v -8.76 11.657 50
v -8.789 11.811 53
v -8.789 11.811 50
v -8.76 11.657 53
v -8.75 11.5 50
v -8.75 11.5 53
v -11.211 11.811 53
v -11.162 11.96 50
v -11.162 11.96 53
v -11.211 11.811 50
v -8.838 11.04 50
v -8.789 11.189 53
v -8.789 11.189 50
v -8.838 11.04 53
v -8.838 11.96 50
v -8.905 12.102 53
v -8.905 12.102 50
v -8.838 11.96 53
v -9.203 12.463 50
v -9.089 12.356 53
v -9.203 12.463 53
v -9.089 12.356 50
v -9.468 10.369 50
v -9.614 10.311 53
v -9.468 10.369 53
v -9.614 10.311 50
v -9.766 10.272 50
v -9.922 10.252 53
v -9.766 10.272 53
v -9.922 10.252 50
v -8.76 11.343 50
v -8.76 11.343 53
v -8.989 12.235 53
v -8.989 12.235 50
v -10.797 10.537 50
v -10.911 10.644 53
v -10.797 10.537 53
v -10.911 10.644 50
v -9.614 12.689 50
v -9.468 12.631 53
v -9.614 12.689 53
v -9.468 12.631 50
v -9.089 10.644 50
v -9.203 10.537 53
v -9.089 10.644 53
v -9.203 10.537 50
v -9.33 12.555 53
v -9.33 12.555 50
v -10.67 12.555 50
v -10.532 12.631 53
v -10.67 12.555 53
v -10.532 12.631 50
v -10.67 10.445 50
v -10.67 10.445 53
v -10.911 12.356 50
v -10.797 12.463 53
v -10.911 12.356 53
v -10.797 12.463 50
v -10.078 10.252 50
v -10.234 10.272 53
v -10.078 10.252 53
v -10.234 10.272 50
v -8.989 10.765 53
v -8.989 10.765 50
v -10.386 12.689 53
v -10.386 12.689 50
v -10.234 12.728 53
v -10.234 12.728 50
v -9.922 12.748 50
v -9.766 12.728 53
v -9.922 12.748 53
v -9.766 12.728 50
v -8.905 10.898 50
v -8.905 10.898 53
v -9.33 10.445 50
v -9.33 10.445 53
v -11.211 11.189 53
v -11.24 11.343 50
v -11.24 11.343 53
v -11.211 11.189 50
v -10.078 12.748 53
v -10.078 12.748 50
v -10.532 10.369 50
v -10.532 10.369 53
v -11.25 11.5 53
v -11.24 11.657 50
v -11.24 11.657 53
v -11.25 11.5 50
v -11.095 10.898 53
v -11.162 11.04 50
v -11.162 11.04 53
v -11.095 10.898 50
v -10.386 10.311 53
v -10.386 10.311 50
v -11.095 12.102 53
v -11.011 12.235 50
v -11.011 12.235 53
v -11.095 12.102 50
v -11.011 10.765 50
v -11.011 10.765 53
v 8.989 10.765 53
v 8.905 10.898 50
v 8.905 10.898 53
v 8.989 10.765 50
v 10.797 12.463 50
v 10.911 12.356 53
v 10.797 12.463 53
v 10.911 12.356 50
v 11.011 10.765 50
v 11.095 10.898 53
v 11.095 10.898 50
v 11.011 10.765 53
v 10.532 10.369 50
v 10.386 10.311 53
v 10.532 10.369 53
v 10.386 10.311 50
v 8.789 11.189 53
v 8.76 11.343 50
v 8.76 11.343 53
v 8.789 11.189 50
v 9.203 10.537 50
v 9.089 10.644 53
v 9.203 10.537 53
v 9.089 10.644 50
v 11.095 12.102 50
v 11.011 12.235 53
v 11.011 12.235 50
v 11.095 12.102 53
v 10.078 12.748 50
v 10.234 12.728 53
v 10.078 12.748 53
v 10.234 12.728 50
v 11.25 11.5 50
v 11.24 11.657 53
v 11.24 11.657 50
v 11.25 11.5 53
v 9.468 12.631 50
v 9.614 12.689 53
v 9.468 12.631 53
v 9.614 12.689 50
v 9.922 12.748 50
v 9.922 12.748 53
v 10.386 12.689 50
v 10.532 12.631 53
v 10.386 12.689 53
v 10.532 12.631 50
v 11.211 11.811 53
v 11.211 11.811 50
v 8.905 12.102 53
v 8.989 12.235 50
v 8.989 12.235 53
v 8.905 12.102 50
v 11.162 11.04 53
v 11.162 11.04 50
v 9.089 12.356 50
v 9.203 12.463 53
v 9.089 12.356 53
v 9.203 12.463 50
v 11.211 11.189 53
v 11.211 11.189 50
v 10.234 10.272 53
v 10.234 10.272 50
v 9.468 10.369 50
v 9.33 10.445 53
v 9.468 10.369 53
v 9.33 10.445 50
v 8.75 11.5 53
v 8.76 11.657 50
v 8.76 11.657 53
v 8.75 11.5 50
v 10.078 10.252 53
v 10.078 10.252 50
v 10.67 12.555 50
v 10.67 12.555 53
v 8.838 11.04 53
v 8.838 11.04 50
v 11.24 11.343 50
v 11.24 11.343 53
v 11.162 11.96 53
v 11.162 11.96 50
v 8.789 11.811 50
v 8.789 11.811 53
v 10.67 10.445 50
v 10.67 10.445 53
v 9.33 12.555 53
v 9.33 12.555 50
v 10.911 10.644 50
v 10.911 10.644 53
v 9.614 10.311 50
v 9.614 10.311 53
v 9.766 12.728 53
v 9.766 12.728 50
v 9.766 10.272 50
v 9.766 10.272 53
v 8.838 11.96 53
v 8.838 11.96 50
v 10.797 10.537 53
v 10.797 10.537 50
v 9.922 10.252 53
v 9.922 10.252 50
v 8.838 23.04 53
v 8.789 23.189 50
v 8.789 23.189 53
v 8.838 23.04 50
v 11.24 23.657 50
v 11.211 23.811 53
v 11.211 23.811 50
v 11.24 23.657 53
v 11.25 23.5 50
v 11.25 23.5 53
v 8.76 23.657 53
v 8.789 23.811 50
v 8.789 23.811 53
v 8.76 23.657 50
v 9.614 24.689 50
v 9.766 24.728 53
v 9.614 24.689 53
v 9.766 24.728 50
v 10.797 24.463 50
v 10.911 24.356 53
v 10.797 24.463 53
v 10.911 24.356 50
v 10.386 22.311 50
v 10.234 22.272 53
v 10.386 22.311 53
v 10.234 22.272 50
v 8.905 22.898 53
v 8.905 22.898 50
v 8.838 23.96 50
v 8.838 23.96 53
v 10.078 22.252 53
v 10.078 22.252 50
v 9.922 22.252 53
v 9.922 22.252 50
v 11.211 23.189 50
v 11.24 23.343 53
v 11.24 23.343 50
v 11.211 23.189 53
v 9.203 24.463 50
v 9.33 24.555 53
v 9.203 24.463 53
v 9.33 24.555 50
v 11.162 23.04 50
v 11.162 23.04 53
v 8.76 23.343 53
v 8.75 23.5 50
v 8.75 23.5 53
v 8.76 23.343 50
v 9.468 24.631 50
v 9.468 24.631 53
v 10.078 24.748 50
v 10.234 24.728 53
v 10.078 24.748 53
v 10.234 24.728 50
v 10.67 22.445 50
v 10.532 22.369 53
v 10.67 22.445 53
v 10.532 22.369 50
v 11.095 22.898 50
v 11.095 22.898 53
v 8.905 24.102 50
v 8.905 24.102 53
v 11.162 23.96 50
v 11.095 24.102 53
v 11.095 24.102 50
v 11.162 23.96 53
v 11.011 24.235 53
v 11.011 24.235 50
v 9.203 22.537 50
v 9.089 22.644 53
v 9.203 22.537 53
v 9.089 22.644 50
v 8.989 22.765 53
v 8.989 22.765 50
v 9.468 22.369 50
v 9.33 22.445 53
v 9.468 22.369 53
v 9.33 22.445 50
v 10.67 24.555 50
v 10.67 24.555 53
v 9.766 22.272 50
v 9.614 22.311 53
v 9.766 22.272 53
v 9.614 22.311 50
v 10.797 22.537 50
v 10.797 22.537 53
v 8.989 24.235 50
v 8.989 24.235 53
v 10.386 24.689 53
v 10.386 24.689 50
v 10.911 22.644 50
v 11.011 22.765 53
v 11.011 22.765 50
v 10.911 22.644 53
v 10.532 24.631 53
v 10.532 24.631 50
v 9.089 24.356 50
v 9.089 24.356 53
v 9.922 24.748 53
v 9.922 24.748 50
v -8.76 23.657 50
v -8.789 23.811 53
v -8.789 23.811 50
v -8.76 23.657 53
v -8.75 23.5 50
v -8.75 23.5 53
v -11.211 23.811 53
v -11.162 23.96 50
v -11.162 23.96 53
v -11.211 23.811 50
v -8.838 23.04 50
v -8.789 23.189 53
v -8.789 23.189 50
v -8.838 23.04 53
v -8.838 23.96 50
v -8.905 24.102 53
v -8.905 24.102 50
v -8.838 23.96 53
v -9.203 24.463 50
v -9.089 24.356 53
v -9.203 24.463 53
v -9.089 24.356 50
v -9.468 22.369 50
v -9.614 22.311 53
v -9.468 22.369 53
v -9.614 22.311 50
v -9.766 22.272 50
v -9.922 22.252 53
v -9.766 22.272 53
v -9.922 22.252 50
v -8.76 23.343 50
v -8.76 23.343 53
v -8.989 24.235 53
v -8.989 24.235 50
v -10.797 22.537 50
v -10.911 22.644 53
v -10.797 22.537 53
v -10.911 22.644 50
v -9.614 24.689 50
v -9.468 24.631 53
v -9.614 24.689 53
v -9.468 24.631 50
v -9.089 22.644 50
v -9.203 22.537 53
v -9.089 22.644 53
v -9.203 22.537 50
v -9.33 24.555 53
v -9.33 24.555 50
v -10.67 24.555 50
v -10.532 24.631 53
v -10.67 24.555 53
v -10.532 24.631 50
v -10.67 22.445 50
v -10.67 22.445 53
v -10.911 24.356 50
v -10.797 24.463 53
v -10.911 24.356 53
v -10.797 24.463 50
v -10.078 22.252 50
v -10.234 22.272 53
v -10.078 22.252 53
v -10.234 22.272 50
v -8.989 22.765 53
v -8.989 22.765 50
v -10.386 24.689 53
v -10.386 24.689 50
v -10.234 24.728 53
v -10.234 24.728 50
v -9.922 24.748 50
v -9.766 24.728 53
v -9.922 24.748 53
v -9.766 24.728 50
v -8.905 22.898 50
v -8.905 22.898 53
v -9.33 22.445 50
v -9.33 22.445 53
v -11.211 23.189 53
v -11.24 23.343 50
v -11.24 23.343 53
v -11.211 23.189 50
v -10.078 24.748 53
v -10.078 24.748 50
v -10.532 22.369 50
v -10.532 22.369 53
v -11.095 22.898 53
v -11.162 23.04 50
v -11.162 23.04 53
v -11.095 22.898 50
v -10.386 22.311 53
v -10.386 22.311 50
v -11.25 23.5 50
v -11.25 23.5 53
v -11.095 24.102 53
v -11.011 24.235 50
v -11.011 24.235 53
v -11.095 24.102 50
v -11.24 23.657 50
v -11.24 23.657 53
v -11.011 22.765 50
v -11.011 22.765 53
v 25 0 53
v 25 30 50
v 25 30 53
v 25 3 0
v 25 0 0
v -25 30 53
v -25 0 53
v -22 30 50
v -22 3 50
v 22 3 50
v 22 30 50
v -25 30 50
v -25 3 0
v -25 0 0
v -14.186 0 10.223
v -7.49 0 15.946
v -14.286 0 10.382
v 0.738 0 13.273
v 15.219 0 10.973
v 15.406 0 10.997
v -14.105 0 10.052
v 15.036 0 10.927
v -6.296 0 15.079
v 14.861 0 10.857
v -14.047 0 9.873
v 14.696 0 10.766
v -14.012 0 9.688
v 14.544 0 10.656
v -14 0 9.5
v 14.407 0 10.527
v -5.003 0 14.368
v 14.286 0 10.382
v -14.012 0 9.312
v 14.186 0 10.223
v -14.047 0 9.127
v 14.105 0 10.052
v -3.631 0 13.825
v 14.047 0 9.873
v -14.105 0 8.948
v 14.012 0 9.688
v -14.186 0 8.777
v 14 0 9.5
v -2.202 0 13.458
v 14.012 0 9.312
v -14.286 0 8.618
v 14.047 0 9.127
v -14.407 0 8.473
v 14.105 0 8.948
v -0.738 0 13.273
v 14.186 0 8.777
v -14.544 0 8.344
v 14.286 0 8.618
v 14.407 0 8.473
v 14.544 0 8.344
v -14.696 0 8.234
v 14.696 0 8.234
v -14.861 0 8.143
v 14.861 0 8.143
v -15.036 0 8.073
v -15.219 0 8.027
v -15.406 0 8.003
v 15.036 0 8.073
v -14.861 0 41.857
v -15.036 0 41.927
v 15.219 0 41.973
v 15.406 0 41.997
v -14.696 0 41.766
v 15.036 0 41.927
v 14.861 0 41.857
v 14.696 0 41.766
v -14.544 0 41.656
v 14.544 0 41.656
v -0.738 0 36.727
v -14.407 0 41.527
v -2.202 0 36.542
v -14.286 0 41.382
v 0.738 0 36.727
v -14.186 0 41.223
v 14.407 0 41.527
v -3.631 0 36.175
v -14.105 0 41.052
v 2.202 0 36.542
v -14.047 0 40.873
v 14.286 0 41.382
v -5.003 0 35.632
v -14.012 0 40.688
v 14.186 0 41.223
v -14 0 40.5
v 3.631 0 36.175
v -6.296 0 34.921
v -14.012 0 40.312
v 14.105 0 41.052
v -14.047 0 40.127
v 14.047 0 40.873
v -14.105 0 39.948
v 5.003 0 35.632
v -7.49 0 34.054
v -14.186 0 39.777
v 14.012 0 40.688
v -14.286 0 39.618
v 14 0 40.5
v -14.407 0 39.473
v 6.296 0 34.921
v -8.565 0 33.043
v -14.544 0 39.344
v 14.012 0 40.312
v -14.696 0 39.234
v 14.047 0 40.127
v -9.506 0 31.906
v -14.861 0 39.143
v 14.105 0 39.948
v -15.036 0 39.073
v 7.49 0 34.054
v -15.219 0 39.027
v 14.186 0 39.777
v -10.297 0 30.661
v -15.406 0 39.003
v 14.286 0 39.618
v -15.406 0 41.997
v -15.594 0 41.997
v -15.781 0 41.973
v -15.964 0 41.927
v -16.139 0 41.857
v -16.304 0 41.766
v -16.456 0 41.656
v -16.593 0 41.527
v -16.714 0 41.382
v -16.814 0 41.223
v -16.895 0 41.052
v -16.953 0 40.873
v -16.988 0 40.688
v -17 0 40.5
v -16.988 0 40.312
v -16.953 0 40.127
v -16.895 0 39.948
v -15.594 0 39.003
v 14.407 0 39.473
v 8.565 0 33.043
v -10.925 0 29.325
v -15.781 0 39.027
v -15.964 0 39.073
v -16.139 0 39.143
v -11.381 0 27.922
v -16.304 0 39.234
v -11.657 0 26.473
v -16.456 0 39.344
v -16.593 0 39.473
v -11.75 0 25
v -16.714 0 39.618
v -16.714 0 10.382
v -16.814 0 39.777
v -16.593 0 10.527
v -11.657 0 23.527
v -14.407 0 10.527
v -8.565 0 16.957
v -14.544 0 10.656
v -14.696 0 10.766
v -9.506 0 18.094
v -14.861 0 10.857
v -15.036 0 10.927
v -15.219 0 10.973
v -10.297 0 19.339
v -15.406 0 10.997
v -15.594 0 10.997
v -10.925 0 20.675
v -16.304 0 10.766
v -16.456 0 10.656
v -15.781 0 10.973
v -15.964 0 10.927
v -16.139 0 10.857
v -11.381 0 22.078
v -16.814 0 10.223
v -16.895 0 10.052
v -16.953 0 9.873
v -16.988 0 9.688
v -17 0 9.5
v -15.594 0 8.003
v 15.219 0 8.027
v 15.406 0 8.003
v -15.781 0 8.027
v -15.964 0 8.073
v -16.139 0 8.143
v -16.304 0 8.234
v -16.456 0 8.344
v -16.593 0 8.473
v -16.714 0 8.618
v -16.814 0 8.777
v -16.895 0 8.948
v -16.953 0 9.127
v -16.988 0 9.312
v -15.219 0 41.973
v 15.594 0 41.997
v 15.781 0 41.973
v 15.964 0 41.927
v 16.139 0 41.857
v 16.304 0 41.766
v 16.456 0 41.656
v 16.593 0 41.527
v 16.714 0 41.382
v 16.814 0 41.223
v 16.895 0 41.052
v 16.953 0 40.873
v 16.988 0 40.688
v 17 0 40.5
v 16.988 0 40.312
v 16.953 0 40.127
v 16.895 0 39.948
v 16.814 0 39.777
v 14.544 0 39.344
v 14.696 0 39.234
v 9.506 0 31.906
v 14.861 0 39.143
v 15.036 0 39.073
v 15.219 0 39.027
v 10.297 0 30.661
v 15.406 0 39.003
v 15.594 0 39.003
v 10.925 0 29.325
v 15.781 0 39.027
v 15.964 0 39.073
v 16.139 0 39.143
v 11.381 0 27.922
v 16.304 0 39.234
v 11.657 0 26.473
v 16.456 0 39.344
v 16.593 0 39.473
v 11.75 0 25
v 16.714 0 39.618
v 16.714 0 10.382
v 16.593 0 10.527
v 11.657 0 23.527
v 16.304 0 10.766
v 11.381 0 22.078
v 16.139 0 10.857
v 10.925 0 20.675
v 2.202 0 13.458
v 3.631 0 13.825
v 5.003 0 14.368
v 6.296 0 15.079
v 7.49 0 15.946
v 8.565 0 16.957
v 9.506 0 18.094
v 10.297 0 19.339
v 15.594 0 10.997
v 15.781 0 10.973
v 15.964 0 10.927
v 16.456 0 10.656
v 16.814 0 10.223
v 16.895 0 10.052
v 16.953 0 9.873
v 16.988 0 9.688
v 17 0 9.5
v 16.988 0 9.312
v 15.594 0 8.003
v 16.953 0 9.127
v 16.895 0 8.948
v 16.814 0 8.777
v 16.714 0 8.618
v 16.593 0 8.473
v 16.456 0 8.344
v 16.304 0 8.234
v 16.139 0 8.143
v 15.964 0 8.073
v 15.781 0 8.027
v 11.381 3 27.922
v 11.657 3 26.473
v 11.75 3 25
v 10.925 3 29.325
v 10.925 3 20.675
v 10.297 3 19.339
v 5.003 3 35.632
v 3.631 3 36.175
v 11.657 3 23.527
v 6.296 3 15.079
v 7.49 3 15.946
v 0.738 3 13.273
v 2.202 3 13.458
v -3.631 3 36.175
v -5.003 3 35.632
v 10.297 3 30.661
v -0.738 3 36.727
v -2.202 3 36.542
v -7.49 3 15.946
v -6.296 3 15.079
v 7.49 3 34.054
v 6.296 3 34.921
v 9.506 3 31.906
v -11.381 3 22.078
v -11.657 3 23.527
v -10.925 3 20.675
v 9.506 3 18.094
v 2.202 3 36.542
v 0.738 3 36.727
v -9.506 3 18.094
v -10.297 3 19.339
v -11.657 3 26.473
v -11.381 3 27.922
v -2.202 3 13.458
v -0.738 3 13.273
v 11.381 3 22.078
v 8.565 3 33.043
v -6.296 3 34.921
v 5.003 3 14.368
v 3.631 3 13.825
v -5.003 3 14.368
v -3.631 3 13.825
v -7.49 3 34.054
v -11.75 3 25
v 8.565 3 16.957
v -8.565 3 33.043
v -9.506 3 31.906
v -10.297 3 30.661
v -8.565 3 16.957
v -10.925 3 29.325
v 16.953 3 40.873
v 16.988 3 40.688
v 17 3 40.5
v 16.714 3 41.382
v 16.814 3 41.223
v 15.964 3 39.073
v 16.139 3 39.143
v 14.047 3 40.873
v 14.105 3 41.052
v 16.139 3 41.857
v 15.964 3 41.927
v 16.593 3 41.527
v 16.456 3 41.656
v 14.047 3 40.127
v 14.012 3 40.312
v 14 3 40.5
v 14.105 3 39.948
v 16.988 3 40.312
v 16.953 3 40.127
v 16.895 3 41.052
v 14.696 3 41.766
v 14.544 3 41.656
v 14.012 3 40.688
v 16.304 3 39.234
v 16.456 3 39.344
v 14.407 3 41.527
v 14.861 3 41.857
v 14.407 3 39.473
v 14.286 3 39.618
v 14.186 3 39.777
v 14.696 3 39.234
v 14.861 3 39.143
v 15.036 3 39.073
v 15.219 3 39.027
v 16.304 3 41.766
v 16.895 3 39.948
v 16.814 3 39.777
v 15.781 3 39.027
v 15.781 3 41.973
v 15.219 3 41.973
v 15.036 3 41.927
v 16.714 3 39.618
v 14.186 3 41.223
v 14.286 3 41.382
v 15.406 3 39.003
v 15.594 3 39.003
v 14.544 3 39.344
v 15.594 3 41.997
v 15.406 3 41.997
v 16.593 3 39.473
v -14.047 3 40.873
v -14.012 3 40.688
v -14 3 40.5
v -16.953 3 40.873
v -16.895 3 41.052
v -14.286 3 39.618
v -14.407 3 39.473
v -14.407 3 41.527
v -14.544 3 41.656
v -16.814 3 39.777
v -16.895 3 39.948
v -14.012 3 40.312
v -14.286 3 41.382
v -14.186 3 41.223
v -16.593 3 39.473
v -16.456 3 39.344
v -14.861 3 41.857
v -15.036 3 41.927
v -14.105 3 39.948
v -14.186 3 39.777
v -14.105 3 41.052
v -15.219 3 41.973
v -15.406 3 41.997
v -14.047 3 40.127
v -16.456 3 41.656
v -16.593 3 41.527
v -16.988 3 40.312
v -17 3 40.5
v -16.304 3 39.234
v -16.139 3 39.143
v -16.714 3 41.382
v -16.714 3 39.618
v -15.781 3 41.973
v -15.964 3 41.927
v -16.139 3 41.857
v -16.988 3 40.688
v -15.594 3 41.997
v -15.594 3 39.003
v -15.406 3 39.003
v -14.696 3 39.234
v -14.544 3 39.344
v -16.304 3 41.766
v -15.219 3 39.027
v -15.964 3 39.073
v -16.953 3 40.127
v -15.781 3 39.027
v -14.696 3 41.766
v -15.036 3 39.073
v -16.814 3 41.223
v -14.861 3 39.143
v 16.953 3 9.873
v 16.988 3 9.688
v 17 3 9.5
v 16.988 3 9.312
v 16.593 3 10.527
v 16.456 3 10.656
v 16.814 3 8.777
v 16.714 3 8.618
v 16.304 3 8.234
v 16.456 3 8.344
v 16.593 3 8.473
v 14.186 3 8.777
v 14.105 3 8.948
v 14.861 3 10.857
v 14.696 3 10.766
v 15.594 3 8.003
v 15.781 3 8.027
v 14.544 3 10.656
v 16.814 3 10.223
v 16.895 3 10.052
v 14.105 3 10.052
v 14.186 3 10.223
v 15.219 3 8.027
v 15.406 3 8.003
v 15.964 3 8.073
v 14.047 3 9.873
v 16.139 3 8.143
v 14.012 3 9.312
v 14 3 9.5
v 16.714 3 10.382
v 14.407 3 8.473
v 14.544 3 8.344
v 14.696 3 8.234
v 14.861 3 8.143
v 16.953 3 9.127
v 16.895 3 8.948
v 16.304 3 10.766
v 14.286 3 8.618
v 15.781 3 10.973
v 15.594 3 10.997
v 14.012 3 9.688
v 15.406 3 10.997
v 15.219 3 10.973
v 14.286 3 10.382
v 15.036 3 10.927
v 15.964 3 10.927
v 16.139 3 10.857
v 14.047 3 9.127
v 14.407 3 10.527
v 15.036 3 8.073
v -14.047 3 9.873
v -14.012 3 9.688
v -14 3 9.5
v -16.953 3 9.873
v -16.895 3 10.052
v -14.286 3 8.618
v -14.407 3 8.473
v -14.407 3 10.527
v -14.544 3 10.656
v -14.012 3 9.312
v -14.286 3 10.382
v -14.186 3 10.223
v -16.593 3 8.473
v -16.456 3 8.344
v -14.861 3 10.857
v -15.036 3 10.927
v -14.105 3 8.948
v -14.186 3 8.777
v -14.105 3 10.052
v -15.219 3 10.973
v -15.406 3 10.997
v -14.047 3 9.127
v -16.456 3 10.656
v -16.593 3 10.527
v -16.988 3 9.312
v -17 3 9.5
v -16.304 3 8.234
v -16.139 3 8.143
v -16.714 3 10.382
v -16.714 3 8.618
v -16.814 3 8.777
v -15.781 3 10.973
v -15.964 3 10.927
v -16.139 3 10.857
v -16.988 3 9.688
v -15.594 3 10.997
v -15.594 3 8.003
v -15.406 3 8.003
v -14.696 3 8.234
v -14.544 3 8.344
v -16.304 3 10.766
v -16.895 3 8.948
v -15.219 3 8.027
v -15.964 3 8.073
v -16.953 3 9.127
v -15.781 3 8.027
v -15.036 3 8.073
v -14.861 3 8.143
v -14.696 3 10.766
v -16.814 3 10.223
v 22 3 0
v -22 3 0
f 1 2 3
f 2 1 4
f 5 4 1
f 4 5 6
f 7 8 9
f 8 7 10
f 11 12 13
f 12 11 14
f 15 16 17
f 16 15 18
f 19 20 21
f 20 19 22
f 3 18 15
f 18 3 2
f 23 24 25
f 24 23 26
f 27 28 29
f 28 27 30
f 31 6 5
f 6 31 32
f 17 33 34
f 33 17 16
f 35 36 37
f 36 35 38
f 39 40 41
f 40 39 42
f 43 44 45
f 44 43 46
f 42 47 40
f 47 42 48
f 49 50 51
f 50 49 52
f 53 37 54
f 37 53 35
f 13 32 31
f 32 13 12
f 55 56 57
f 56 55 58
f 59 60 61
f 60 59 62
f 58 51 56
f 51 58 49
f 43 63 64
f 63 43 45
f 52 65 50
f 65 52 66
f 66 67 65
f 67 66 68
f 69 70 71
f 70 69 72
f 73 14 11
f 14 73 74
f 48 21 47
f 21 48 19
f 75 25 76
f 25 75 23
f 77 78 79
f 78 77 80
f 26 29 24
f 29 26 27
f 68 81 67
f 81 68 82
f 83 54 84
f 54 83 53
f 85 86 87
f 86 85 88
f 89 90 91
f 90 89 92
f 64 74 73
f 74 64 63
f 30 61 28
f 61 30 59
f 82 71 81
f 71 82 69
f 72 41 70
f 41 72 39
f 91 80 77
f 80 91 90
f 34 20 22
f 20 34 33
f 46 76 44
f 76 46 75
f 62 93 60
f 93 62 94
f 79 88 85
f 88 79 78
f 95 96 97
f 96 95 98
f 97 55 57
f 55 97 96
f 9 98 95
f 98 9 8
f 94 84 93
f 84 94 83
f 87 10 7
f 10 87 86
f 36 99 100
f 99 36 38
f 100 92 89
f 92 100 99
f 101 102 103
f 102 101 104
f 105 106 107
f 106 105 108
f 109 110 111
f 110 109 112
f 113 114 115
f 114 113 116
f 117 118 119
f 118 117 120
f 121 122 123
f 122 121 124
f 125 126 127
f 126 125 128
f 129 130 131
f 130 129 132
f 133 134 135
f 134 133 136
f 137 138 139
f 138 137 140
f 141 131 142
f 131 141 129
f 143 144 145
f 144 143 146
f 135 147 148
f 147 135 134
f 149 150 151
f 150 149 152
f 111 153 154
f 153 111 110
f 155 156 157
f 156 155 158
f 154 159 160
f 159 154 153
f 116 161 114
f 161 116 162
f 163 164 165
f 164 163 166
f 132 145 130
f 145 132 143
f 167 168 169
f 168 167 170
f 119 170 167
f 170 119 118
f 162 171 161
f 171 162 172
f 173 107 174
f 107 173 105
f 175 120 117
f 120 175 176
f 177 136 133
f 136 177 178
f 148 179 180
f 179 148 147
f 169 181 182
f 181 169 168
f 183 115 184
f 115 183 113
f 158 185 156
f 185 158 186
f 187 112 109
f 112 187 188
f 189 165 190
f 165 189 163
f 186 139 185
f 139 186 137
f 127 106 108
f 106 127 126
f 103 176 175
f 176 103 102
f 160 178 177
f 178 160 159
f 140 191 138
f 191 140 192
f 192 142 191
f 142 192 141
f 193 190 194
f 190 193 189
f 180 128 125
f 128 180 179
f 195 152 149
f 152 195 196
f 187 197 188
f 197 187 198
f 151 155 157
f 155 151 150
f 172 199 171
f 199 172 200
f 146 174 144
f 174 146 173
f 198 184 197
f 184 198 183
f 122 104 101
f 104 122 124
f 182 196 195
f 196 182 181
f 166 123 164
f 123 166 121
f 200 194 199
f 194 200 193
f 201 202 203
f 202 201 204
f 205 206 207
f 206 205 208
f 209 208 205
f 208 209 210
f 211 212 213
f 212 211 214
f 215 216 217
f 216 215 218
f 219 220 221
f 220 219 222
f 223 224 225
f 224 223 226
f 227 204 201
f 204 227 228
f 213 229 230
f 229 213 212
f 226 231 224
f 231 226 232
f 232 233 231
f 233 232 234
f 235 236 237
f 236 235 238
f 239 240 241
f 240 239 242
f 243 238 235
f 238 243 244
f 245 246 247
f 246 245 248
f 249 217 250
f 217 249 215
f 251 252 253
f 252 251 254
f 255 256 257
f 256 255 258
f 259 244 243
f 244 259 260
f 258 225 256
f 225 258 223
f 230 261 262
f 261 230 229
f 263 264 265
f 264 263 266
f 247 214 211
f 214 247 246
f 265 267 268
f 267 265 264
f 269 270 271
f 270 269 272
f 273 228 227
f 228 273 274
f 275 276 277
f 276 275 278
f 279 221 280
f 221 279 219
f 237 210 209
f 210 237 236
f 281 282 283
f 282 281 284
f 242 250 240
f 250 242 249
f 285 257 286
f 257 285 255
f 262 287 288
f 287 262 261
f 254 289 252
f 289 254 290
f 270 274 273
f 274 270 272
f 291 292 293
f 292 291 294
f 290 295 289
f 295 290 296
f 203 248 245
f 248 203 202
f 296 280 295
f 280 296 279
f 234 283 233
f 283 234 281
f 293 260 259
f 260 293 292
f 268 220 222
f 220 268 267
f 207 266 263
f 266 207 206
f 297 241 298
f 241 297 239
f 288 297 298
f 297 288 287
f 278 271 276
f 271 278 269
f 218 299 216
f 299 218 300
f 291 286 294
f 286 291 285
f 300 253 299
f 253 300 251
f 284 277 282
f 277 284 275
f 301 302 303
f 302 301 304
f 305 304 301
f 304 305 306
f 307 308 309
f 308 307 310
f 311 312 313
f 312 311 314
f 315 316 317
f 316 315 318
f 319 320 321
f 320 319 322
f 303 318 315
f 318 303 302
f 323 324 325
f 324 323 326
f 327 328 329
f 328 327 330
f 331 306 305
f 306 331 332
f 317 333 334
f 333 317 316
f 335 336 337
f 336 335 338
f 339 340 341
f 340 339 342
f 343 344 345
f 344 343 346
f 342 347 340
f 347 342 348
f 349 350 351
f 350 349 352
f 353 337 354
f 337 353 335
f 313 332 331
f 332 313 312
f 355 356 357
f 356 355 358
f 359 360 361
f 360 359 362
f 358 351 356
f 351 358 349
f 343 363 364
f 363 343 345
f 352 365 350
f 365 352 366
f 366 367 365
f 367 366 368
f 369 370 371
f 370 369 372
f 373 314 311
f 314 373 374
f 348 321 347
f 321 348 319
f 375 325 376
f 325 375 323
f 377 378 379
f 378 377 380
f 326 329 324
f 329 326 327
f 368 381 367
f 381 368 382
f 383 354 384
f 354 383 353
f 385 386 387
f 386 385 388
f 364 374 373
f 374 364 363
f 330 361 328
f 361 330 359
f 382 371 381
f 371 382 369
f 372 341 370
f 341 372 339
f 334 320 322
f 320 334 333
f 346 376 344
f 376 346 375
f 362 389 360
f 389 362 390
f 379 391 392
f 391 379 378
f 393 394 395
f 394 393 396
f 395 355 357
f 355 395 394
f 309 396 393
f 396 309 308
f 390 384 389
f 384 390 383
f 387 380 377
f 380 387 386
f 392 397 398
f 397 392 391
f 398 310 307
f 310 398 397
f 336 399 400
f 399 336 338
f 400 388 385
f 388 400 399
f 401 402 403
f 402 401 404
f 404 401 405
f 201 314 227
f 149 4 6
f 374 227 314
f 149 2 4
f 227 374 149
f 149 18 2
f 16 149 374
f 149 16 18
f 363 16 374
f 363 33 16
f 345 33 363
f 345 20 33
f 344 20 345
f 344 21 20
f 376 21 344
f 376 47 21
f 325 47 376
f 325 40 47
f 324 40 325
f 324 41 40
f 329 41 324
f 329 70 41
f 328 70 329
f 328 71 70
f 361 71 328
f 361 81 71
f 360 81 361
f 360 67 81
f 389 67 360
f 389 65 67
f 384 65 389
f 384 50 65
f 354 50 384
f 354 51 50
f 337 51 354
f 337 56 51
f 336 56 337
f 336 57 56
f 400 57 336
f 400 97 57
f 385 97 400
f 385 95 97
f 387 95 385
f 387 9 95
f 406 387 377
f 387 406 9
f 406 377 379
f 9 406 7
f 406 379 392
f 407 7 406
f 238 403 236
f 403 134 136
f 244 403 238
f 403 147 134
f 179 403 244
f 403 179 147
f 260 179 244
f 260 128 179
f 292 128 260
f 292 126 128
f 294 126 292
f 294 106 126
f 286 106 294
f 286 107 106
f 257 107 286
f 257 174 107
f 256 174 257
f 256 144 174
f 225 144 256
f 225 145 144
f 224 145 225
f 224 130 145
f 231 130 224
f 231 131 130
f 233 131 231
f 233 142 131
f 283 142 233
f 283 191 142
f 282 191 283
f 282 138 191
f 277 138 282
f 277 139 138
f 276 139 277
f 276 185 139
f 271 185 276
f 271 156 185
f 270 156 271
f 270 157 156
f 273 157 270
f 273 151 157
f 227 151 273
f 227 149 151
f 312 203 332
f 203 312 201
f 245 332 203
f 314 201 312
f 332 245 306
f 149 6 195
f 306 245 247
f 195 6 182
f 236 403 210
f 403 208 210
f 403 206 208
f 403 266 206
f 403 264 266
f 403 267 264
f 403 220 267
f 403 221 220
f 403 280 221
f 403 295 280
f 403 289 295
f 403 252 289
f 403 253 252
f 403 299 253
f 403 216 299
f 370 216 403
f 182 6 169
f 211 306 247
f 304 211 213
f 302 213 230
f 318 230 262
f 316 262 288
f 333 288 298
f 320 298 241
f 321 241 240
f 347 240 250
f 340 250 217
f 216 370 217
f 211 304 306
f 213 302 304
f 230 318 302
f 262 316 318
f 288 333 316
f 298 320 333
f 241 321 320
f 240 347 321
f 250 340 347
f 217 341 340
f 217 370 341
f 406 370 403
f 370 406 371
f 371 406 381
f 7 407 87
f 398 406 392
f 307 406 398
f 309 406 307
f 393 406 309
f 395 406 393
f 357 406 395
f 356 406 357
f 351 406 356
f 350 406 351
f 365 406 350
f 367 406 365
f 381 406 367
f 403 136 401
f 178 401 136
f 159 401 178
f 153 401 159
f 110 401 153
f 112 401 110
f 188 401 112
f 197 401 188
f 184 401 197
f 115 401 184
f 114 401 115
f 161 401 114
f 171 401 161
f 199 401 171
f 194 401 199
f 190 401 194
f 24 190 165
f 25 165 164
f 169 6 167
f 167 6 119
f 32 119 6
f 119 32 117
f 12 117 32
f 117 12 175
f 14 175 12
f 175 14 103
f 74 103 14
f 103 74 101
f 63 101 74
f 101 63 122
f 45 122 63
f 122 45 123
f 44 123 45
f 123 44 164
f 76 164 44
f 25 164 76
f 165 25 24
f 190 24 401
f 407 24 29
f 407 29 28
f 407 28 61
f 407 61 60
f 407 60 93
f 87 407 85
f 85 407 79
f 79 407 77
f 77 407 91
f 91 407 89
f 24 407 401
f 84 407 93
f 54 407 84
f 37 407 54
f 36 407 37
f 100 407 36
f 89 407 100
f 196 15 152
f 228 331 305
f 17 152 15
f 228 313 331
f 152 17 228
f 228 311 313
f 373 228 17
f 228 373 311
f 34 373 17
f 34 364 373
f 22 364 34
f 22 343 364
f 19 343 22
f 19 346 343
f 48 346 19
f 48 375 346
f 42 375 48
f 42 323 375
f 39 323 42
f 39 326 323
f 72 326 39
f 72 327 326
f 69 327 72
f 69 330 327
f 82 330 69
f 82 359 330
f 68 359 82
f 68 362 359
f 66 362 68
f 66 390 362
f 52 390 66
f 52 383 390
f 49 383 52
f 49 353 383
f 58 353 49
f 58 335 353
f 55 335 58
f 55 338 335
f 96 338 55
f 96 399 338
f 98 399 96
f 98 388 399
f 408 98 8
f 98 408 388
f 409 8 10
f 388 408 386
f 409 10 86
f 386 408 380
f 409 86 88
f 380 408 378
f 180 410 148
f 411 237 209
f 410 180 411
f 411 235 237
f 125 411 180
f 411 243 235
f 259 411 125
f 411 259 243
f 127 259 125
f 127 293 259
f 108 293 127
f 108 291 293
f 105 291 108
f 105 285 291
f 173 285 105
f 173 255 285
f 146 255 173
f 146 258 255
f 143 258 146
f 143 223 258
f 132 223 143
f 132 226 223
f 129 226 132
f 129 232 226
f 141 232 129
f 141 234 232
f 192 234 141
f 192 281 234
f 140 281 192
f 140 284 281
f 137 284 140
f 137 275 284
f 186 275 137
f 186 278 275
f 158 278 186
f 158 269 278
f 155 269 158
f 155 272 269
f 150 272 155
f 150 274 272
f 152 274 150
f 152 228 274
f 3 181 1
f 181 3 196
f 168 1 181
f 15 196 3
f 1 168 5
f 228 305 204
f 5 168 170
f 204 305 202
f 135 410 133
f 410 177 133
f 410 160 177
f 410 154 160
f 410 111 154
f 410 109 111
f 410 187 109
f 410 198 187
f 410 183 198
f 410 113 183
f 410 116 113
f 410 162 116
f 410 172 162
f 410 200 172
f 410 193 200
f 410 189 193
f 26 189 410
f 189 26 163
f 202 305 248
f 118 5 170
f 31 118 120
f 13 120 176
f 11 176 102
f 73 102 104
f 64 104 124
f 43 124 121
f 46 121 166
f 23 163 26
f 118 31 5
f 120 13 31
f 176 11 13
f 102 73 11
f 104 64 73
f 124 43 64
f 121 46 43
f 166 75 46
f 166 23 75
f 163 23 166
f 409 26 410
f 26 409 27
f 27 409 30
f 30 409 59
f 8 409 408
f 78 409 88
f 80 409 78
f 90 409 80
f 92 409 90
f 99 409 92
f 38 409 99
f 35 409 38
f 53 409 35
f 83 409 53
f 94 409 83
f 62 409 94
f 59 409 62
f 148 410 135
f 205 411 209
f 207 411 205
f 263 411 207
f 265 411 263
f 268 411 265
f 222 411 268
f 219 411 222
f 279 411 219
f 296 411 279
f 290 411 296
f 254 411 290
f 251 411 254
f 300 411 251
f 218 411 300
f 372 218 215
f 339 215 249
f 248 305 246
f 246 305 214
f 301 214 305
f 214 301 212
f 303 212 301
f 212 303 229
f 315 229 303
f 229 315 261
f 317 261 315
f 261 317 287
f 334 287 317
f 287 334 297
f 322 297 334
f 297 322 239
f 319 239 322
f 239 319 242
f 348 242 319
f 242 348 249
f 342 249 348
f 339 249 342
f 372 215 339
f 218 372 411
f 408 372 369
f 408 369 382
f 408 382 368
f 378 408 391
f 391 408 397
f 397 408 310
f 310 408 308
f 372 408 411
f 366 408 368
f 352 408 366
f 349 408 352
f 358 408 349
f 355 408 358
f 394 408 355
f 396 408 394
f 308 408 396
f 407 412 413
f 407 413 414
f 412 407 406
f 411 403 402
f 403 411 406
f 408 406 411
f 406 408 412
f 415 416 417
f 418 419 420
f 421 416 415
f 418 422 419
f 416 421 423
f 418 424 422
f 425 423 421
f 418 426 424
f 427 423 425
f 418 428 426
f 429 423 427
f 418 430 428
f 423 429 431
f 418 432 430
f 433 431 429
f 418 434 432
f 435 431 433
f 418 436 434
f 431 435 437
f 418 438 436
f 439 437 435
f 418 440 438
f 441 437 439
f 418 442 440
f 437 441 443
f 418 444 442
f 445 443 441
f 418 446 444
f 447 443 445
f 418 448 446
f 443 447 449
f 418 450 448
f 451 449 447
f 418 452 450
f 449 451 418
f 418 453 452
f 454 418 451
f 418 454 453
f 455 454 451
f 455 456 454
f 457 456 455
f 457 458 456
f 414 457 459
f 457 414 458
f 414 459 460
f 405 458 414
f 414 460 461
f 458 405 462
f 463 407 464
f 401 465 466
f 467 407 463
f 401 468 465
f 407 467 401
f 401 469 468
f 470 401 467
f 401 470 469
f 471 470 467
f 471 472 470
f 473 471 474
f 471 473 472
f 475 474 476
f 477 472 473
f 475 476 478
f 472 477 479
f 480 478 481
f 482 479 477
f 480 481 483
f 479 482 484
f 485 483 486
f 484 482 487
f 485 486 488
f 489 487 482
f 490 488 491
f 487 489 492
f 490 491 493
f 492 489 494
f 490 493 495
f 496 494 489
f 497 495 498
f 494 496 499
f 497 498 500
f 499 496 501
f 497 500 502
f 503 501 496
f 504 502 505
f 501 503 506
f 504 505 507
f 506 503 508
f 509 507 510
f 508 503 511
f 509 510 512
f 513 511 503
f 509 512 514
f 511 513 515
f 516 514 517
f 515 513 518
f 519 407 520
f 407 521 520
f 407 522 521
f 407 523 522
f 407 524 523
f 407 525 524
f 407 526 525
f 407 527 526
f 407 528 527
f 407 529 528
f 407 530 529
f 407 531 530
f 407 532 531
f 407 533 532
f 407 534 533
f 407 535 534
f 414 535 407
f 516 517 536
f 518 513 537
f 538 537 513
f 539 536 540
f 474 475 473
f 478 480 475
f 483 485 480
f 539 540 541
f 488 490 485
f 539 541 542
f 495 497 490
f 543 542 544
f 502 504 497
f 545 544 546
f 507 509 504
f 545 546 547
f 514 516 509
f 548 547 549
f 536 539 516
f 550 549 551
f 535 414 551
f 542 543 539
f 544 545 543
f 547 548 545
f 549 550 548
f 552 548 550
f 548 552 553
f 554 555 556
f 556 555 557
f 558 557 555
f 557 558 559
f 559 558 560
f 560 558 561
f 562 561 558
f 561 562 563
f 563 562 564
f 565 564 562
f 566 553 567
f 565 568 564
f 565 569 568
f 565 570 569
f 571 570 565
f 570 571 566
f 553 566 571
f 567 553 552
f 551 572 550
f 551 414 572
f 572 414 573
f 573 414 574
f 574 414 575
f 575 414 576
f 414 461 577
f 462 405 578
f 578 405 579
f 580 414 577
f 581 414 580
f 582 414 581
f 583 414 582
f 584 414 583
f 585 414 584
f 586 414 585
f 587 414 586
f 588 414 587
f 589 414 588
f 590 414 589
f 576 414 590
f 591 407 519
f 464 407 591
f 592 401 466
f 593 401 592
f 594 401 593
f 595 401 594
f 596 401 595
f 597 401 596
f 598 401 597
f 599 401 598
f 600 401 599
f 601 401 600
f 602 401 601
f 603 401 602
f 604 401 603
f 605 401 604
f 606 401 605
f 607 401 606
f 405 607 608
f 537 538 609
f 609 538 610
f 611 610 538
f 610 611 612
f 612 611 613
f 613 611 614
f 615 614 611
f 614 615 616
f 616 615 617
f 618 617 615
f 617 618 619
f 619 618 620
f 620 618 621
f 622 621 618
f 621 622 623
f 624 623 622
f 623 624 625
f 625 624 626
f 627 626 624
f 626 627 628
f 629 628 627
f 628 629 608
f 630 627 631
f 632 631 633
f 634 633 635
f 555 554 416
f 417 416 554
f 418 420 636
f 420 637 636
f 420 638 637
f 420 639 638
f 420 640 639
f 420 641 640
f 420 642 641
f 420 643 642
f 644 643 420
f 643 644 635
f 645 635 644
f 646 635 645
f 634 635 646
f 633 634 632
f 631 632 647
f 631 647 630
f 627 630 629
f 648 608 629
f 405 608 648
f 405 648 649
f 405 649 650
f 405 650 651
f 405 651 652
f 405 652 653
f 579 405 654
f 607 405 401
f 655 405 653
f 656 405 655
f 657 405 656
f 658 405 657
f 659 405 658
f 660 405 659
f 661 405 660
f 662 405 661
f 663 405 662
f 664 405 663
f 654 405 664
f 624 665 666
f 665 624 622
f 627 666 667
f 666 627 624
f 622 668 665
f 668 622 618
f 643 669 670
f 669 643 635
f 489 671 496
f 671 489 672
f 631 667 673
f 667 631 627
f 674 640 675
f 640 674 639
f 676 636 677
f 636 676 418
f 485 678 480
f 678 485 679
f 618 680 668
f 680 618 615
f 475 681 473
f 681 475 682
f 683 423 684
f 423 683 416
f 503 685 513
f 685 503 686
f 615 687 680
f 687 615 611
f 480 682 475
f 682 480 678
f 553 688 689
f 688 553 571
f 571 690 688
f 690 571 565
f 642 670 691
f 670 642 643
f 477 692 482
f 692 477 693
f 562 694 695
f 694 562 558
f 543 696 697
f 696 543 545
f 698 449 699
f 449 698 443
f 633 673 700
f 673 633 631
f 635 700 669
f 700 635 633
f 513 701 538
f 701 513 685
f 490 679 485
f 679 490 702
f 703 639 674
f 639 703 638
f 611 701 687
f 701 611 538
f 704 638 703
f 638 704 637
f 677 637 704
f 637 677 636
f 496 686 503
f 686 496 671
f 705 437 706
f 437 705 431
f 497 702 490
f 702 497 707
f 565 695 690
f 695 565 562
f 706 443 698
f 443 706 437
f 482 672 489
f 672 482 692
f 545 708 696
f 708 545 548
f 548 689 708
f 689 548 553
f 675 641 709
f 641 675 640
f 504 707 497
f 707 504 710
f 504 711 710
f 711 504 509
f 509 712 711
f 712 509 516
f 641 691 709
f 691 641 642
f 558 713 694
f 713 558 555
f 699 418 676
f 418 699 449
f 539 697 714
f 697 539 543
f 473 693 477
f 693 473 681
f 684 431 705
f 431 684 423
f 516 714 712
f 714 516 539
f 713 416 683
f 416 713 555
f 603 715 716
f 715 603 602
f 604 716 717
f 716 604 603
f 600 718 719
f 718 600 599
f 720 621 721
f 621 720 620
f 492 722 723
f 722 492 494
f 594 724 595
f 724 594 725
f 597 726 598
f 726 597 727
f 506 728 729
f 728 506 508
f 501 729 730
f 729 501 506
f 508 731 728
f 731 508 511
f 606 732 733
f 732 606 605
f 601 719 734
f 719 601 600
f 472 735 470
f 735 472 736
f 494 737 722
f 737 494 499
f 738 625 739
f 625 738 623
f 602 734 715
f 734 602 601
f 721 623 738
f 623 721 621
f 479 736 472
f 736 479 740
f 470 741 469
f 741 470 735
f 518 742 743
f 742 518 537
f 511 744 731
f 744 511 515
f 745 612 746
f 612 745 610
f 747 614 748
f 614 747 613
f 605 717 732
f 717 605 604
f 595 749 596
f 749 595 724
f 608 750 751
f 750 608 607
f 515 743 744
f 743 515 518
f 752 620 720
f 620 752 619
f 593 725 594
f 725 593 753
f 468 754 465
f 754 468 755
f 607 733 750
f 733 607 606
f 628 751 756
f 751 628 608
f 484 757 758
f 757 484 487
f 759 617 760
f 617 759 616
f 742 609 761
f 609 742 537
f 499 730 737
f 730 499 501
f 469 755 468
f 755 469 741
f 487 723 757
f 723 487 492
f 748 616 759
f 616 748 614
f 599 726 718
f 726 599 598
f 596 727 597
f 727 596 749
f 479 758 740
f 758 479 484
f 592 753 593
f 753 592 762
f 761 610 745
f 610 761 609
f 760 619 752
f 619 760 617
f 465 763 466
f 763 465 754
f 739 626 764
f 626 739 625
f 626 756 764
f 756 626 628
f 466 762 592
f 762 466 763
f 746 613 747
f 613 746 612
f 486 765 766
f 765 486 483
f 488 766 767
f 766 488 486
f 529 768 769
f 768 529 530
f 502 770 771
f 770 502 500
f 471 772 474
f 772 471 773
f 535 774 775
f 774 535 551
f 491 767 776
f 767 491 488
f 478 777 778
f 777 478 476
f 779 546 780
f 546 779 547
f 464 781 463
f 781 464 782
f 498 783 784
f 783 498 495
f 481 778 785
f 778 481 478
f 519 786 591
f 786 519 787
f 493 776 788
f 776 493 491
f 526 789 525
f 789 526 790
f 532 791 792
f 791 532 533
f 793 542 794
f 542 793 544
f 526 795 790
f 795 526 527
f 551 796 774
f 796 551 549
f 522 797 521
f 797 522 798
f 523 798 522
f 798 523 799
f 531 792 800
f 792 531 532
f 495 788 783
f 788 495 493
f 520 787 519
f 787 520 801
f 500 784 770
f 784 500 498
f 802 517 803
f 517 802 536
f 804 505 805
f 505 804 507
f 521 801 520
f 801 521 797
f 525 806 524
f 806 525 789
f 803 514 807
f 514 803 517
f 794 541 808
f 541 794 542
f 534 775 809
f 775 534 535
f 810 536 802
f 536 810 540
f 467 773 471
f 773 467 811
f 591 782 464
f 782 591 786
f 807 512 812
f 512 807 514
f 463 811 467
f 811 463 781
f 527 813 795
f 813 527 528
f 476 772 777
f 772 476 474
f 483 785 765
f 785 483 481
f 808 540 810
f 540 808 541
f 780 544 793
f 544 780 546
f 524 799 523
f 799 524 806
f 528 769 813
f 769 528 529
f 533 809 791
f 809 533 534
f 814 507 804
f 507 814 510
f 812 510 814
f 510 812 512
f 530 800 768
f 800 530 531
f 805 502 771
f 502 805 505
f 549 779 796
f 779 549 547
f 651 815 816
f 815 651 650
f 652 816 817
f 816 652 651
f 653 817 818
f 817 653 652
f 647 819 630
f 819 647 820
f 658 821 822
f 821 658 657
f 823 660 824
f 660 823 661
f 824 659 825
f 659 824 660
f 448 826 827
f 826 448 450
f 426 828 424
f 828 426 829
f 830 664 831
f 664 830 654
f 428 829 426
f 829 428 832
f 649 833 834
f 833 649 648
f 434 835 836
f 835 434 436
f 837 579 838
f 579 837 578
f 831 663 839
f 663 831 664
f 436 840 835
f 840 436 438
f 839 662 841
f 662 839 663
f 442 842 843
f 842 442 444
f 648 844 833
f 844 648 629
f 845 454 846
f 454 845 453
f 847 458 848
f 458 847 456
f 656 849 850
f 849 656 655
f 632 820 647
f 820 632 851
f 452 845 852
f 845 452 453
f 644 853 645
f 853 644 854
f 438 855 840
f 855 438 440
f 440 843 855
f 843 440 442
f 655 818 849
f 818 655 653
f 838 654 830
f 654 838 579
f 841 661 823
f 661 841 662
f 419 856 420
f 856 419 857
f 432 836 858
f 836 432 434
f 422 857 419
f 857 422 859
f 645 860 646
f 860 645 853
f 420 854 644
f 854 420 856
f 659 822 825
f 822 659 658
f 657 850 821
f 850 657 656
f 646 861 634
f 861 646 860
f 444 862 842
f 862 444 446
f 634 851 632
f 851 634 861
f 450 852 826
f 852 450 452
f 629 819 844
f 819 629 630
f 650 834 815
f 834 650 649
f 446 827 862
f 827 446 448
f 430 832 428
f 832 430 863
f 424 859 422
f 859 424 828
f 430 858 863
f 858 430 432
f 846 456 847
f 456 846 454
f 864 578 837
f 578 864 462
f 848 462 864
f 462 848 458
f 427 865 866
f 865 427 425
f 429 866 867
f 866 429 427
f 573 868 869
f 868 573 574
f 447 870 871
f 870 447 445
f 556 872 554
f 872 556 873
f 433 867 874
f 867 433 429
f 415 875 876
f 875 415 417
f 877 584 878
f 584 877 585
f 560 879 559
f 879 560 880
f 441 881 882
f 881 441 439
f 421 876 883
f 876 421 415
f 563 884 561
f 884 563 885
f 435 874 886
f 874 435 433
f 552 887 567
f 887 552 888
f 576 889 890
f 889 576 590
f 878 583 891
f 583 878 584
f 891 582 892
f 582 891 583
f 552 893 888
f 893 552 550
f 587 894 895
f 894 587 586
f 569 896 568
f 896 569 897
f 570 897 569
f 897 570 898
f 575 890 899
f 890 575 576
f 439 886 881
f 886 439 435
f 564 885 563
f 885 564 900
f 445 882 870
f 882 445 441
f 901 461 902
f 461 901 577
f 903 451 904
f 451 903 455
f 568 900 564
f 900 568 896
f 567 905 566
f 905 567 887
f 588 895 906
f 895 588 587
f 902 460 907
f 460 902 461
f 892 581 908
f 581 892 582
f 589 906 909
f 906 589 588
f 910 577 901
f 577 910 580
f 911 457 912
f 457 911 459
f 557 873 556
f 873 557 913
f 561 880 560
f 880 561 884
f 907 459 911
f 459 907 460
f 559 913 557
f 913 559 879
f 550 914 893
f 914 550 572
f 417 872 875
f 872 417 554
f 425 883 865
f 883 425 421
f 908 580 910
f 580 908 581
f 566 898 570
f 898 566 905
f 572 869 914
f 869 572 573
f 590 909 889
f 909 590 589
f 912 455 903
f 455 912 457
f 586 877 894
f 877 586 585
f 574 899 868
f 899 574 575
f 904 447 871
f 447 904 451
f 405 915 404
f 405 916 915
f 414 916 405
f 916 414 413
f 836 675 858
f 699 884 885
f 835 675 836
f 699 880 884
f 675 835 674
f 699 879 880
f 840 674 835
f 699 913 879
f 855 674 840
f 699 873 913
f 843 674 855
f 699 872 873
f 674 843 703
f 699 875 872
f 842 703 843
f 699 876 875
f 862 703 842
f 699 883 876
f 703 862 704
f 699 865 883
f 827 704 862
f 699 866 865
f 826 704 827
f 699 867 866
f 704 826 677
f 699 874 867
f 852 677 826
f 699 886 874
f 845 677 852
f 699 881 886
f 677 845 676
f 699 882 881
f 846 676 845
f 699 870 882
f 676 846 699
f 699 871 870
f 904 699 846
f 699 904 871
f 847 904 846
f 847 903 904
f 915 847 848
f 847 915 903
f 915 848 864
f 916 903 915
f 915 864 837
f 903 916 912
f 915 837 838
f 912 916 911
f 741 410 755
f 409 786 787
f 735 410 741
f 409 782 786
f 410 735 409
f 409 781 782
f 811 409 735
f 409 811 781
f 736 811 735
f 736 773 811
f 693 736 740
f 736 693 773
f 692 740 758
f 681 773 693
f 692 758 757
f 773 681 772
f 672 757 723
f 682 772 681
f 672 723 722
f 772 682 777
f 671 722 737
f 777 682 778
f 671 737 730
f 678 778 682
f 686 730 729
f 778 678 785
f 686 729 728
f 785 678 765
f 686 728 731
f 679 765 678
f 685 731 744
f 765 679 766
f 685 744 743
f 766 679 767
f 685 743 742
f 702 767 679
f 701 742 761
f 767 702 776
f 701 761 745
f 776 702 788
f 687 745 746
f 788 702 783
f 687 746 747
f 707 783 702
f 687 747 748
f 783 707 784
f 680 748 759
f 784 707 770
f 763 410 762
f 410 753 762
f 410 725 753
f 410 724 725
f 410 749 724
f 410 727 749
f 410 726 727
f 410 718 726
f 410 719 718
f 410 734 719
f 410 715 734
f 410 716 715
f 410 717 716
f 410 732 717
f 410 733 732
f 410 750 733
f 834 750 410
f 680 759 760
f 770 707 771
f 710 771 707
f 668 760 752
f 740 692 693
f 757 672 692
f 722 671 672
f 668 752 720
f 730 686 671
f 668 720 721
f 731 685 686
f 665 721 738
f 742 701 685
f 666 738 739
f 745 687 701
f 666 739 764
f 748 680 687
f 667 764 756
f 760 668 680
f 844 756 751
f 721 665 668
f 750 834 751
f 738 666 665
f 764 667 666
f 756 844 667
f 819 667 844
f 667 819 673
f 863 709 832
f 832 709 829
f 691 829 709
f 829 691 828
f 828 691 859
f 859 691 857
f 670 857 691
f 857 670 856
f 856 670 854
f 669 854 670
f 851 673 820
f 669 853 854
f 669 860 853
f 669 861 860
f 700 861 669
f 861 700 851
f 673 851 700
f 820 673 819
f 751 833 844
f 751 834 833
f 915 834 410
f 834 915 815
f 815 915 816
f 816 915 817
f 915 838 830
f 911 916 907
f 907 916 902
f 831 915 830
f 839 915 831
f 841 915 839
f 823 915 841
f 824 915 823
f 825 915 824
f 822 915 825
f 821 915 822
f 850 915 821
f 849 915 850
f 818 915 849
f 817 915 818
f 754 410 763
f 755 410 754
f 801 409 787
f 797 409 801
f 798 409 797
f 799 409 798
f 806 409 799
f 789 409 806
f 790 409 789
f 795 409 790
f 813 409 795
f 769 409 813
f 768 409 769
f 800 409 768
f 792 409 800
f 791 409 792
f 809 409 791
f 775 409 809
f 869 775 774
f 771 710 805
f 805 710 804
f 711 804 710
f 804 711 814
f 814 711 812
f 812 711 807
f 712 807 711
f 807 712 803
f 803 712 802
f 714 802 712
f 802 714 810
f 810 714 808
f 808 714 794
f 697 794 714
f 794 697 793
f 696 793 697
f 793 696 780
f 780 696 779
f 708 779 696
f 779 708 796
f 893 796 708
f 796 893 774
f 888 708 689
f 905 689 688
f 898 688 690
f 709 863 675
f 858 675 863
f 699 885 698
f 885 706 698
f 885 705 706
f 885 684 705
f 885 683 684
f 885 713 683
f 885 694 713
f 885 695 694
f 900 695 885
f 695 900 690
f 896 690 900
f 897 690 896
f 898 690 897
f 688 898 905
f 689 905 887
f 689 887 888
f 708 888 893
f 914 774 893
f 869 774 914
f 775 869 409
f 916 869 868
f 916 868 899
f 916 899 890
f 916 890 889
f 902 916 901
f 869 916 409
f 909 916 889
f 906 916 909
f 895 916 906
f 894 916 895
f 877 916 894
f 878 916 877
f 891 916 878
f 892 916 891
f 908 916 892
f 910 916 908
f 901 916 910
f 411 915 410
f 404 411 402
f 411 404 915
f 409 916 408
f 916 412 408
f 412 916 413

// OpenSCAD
// Anet A2 mount for NEMA 17 direct extruder
// https://github.com/bendetat/anet-a2-mount-for-direct-extruder
//
// NEMA 17 model (http://www.thingiverse.com/thing:3165) from Bogdam Kecman (http://www.thingiverse.com/BogdanKecman/about)

// Set the length to 50 for a standard NEMA 17 stepper, or 30 for a pancake stepper

$fn = 50;

width = 50;
length = 30; //50;
thickness = 3;

translate([0,length/2,width])
top_plate();
back_plate();
translate([width/2, 0, 0])
brace();
translate([-width/2 + thickness, 0, 0])
brace();

// Uncomment to see with a NEMA 17 in position
//translate([0,thickness+0.2,width/2])
//rotate([90,0,0])
//nema17();

module brace() {
    translate([0,thickness,0])
    rotate([0,270,0])
    linear_extrude(height=thickness)
    polygon([
        [0,0],
        [width,0],
        [width,length-thickness]
    ]);
}

module back_plate() {
    translate([
        -width/2,
        0,
        0
    ])
    difference() {
        cube([
            width,
            thickness,
            width
        ]);
        
        translate([width/2,thickness+0.1,width/2])
        rotate([90,0,0])
        {
            // shaft
            cylinder(d=23.5,h=20);
        
            // screw holes
            translate([15.5,15.5,0])
            cylinder(d=3,h=10);
            translate([-15.5,15.5,0])
            cylinder(d=3,h=10);
            translate([15.5,-15.5,0])
            cylinder(d=3,h=10);
            translate([-15.5,-15.5,0])
            cylinder(d=3,h=10);
        }
    }
}

module top_plate() {
    difference() {
        translate([-width/2, -length/2, 0])
        cube([width, length, 3]);
        
        translate([0,(length-25)/2,0]) {
            translate([-10, -6, -0.1])
            cylinder(d=2.5, h=thickness*1.1);
            translate([10, -6, -0.1])
            cylinder(d=2.5, h=thickness*1.1);
            translate([10, 6, -0.1])
            cylinder(d=2.5, h=thickness*1.1);
            translate([-10, 6, -0.1])
            cylinder(d=2.5, h=thickness*1.1);
        }
    }
}


module rounded_box(dimensions, radius) {
    translate([radius, radius, radius]) {
        minkowski() {
            cube([
                dimensions[0] - radius,
                dimensions[1] - radius,
                dimensions[2] - radius
            ]);
            sphere(r=radius);
        }
    }
}


















// Model: NEMA23
// Model: NEMA17
// Author: Bogdan Kecman
// Licence: GPL
//
// Usage:
// nema17(1); //nema17 double shaft
// nema17(); //nema17 siingle shaft
// nema23(1, 1); //nema23 double shaft cylinder
// nema23(1); //nema23 double shaft cube
// nema23(); //nema23 single shaft cube
// nema23(0,1); //nema23 single shaft cylinder



module nema23(has_back, is_cylinder){
  mplate = 56.9; //mounting plate width
  mplateH = 5.3; //mounting plate height

  ringR = 38.10 / 2; //ring radius
  ringH = 1.3; //ring thickness

  shaftR = 6.337/2; //shaft radius
  shaftH = 20.6;  //shaft lenght

  bodyL = 46.5; //46.5, 56.1, 77.7, 103.1, ...
  bodyInnerCube = 37.6;

  holeR = 5.21/2;
  holeL = 47.14/2; //distance between hole centres

  difference(){
    union(){
      //mounting plate
      color([0.7,0.7,0.7]) cube(size = [mplate,mplate,mplateH], center = true);
      //ring
      color([0.7,0.7,0.7]) translate(v=[0,0,mplateH/2+ringH/2]) cylinder(r=ringR, h=ringH, center=true);
      //shaft front
      color([0.9,0.9,0.9]) translate(v=[0,0,mplateH/2+ringH+shaftH/2])cylinder(r=shaftR, h=shaftH, center=true);
      if (has_back == 1){
        color([0.9,0.9,0.9])  translate(v=[0,0,0-bodyL-shaftH/2]) cylinder(r=shaftR, h=shaftH, center=true);
      }
      //body
      if (is_cylinder == 1){
        color([0.1,0.1,0.1]) translate(v=[0,0,0-mplateH/2-bodyL/2]) cylinder(r=mplate/2, h=bodyL, center=true);
      }else{
        union(){
          color([0.1,0.1,0.1]) translate(v=[0,0,0-mplateH/2-bodyL/2]) cube(size = [bodyInnerCube, mplate, bodyL], center=true);
          color([0.1,0.1,0.1]) translate(v=[0,0,0-mplateH/2-bodyL/2]) cube(size = [mplate,bodyInnerCube, bodyL], center=true);
        }
      }
    }
    translate(v=[holeL,holeL,0]) cylinder(r = holeR, h = 2*mplateH, center=true);
    translate(v=[-holeL,holeL,0]) cylinder(r = holeR, h = 2*mplateH, center=true);
    translate(v=[-holeL,-holeL,0]) cylinder(r = holeR, h = 2*mplateH, center=true);
    translate(v=[holeL,-holeL,0]) cylinder(r = holeR, h = 2*mplateH, center=true);
  }
  
}

module nema17(has_back, is_cylinder){
  mplate = 42.67; //mounting plate width
  mplateH = 0; //mounting plate height

  ringR = 22 / 2; //ring radius, can be 21.95/2
  ringH = 2; //ring thickness

  shaftR = 5/2; //shaft radius, can be 4.988/2
  shaftH = 20.07;  //shaft lenght

  bodyL = 46.5; //25.3, 33.13, 34.7, 40.9, 47.0, ...

  holeR = 3.5/2; //M3 or M4 or #4-40
  holeL = 31.0/2; //distance between hole centres

  difference(){
    union(){
      //ring
      color([0.7,0.7,0.7]) translate(v=[0,0,ringH/2]) cylinder(r=ringR, h=ringH, center=true);
      //shaft front
      color([0.9,0.9,0.9]) translate(v=[0,0,ringH+shaftH/2])cylinder(r=shaftR, h=shaftH, center=true);
      if (has_back == 1){
        color([0.9,0.9,0.9]) translate(v=[0,0,0-bodyL-shaftH/2]) cylinder(r=shaftR, h=shaftH, center=true);
      }
      //body
      if (is_cylinder == 1){
        color([0.1,0.1,0.1]) translate(v=[0,0,0-bodyL/2]) cylinder(r=mplate/2*1.2, h=bodyL, center=true);
      }else{
        union(){
          color([0.1,0.1,0.1]) translate(v=[0,0,0-bodyL/2]) cube(size = [mplate, mplate, bodyL], center=true);
          color([0.1,0.1,0.1]) translate(v=[0,0,0-bodyL/2]) cube(size = [mplate, mplate, bodyL], center=true);
        }
      }
    }
    translate(v=[holeL,holeL,0-bodyL/2]) cylinder(r = holeR, h = bodyL+10, center=true);
    translate(v=[-holeL,holeL,0-bodyL/2]) cylinder(r = holeR, h = bodyL+10, center=true);
    translate(v=[-holeL,-holeL,0-bodyL/2]) cylinder(r = holeR, h = bodyL+10, center=true);
    translate(v=[holeL,-holeL,0-bodyL/2]) cylinder(r = holeR, h = bodyL+10, center=true);
  }
  
}
